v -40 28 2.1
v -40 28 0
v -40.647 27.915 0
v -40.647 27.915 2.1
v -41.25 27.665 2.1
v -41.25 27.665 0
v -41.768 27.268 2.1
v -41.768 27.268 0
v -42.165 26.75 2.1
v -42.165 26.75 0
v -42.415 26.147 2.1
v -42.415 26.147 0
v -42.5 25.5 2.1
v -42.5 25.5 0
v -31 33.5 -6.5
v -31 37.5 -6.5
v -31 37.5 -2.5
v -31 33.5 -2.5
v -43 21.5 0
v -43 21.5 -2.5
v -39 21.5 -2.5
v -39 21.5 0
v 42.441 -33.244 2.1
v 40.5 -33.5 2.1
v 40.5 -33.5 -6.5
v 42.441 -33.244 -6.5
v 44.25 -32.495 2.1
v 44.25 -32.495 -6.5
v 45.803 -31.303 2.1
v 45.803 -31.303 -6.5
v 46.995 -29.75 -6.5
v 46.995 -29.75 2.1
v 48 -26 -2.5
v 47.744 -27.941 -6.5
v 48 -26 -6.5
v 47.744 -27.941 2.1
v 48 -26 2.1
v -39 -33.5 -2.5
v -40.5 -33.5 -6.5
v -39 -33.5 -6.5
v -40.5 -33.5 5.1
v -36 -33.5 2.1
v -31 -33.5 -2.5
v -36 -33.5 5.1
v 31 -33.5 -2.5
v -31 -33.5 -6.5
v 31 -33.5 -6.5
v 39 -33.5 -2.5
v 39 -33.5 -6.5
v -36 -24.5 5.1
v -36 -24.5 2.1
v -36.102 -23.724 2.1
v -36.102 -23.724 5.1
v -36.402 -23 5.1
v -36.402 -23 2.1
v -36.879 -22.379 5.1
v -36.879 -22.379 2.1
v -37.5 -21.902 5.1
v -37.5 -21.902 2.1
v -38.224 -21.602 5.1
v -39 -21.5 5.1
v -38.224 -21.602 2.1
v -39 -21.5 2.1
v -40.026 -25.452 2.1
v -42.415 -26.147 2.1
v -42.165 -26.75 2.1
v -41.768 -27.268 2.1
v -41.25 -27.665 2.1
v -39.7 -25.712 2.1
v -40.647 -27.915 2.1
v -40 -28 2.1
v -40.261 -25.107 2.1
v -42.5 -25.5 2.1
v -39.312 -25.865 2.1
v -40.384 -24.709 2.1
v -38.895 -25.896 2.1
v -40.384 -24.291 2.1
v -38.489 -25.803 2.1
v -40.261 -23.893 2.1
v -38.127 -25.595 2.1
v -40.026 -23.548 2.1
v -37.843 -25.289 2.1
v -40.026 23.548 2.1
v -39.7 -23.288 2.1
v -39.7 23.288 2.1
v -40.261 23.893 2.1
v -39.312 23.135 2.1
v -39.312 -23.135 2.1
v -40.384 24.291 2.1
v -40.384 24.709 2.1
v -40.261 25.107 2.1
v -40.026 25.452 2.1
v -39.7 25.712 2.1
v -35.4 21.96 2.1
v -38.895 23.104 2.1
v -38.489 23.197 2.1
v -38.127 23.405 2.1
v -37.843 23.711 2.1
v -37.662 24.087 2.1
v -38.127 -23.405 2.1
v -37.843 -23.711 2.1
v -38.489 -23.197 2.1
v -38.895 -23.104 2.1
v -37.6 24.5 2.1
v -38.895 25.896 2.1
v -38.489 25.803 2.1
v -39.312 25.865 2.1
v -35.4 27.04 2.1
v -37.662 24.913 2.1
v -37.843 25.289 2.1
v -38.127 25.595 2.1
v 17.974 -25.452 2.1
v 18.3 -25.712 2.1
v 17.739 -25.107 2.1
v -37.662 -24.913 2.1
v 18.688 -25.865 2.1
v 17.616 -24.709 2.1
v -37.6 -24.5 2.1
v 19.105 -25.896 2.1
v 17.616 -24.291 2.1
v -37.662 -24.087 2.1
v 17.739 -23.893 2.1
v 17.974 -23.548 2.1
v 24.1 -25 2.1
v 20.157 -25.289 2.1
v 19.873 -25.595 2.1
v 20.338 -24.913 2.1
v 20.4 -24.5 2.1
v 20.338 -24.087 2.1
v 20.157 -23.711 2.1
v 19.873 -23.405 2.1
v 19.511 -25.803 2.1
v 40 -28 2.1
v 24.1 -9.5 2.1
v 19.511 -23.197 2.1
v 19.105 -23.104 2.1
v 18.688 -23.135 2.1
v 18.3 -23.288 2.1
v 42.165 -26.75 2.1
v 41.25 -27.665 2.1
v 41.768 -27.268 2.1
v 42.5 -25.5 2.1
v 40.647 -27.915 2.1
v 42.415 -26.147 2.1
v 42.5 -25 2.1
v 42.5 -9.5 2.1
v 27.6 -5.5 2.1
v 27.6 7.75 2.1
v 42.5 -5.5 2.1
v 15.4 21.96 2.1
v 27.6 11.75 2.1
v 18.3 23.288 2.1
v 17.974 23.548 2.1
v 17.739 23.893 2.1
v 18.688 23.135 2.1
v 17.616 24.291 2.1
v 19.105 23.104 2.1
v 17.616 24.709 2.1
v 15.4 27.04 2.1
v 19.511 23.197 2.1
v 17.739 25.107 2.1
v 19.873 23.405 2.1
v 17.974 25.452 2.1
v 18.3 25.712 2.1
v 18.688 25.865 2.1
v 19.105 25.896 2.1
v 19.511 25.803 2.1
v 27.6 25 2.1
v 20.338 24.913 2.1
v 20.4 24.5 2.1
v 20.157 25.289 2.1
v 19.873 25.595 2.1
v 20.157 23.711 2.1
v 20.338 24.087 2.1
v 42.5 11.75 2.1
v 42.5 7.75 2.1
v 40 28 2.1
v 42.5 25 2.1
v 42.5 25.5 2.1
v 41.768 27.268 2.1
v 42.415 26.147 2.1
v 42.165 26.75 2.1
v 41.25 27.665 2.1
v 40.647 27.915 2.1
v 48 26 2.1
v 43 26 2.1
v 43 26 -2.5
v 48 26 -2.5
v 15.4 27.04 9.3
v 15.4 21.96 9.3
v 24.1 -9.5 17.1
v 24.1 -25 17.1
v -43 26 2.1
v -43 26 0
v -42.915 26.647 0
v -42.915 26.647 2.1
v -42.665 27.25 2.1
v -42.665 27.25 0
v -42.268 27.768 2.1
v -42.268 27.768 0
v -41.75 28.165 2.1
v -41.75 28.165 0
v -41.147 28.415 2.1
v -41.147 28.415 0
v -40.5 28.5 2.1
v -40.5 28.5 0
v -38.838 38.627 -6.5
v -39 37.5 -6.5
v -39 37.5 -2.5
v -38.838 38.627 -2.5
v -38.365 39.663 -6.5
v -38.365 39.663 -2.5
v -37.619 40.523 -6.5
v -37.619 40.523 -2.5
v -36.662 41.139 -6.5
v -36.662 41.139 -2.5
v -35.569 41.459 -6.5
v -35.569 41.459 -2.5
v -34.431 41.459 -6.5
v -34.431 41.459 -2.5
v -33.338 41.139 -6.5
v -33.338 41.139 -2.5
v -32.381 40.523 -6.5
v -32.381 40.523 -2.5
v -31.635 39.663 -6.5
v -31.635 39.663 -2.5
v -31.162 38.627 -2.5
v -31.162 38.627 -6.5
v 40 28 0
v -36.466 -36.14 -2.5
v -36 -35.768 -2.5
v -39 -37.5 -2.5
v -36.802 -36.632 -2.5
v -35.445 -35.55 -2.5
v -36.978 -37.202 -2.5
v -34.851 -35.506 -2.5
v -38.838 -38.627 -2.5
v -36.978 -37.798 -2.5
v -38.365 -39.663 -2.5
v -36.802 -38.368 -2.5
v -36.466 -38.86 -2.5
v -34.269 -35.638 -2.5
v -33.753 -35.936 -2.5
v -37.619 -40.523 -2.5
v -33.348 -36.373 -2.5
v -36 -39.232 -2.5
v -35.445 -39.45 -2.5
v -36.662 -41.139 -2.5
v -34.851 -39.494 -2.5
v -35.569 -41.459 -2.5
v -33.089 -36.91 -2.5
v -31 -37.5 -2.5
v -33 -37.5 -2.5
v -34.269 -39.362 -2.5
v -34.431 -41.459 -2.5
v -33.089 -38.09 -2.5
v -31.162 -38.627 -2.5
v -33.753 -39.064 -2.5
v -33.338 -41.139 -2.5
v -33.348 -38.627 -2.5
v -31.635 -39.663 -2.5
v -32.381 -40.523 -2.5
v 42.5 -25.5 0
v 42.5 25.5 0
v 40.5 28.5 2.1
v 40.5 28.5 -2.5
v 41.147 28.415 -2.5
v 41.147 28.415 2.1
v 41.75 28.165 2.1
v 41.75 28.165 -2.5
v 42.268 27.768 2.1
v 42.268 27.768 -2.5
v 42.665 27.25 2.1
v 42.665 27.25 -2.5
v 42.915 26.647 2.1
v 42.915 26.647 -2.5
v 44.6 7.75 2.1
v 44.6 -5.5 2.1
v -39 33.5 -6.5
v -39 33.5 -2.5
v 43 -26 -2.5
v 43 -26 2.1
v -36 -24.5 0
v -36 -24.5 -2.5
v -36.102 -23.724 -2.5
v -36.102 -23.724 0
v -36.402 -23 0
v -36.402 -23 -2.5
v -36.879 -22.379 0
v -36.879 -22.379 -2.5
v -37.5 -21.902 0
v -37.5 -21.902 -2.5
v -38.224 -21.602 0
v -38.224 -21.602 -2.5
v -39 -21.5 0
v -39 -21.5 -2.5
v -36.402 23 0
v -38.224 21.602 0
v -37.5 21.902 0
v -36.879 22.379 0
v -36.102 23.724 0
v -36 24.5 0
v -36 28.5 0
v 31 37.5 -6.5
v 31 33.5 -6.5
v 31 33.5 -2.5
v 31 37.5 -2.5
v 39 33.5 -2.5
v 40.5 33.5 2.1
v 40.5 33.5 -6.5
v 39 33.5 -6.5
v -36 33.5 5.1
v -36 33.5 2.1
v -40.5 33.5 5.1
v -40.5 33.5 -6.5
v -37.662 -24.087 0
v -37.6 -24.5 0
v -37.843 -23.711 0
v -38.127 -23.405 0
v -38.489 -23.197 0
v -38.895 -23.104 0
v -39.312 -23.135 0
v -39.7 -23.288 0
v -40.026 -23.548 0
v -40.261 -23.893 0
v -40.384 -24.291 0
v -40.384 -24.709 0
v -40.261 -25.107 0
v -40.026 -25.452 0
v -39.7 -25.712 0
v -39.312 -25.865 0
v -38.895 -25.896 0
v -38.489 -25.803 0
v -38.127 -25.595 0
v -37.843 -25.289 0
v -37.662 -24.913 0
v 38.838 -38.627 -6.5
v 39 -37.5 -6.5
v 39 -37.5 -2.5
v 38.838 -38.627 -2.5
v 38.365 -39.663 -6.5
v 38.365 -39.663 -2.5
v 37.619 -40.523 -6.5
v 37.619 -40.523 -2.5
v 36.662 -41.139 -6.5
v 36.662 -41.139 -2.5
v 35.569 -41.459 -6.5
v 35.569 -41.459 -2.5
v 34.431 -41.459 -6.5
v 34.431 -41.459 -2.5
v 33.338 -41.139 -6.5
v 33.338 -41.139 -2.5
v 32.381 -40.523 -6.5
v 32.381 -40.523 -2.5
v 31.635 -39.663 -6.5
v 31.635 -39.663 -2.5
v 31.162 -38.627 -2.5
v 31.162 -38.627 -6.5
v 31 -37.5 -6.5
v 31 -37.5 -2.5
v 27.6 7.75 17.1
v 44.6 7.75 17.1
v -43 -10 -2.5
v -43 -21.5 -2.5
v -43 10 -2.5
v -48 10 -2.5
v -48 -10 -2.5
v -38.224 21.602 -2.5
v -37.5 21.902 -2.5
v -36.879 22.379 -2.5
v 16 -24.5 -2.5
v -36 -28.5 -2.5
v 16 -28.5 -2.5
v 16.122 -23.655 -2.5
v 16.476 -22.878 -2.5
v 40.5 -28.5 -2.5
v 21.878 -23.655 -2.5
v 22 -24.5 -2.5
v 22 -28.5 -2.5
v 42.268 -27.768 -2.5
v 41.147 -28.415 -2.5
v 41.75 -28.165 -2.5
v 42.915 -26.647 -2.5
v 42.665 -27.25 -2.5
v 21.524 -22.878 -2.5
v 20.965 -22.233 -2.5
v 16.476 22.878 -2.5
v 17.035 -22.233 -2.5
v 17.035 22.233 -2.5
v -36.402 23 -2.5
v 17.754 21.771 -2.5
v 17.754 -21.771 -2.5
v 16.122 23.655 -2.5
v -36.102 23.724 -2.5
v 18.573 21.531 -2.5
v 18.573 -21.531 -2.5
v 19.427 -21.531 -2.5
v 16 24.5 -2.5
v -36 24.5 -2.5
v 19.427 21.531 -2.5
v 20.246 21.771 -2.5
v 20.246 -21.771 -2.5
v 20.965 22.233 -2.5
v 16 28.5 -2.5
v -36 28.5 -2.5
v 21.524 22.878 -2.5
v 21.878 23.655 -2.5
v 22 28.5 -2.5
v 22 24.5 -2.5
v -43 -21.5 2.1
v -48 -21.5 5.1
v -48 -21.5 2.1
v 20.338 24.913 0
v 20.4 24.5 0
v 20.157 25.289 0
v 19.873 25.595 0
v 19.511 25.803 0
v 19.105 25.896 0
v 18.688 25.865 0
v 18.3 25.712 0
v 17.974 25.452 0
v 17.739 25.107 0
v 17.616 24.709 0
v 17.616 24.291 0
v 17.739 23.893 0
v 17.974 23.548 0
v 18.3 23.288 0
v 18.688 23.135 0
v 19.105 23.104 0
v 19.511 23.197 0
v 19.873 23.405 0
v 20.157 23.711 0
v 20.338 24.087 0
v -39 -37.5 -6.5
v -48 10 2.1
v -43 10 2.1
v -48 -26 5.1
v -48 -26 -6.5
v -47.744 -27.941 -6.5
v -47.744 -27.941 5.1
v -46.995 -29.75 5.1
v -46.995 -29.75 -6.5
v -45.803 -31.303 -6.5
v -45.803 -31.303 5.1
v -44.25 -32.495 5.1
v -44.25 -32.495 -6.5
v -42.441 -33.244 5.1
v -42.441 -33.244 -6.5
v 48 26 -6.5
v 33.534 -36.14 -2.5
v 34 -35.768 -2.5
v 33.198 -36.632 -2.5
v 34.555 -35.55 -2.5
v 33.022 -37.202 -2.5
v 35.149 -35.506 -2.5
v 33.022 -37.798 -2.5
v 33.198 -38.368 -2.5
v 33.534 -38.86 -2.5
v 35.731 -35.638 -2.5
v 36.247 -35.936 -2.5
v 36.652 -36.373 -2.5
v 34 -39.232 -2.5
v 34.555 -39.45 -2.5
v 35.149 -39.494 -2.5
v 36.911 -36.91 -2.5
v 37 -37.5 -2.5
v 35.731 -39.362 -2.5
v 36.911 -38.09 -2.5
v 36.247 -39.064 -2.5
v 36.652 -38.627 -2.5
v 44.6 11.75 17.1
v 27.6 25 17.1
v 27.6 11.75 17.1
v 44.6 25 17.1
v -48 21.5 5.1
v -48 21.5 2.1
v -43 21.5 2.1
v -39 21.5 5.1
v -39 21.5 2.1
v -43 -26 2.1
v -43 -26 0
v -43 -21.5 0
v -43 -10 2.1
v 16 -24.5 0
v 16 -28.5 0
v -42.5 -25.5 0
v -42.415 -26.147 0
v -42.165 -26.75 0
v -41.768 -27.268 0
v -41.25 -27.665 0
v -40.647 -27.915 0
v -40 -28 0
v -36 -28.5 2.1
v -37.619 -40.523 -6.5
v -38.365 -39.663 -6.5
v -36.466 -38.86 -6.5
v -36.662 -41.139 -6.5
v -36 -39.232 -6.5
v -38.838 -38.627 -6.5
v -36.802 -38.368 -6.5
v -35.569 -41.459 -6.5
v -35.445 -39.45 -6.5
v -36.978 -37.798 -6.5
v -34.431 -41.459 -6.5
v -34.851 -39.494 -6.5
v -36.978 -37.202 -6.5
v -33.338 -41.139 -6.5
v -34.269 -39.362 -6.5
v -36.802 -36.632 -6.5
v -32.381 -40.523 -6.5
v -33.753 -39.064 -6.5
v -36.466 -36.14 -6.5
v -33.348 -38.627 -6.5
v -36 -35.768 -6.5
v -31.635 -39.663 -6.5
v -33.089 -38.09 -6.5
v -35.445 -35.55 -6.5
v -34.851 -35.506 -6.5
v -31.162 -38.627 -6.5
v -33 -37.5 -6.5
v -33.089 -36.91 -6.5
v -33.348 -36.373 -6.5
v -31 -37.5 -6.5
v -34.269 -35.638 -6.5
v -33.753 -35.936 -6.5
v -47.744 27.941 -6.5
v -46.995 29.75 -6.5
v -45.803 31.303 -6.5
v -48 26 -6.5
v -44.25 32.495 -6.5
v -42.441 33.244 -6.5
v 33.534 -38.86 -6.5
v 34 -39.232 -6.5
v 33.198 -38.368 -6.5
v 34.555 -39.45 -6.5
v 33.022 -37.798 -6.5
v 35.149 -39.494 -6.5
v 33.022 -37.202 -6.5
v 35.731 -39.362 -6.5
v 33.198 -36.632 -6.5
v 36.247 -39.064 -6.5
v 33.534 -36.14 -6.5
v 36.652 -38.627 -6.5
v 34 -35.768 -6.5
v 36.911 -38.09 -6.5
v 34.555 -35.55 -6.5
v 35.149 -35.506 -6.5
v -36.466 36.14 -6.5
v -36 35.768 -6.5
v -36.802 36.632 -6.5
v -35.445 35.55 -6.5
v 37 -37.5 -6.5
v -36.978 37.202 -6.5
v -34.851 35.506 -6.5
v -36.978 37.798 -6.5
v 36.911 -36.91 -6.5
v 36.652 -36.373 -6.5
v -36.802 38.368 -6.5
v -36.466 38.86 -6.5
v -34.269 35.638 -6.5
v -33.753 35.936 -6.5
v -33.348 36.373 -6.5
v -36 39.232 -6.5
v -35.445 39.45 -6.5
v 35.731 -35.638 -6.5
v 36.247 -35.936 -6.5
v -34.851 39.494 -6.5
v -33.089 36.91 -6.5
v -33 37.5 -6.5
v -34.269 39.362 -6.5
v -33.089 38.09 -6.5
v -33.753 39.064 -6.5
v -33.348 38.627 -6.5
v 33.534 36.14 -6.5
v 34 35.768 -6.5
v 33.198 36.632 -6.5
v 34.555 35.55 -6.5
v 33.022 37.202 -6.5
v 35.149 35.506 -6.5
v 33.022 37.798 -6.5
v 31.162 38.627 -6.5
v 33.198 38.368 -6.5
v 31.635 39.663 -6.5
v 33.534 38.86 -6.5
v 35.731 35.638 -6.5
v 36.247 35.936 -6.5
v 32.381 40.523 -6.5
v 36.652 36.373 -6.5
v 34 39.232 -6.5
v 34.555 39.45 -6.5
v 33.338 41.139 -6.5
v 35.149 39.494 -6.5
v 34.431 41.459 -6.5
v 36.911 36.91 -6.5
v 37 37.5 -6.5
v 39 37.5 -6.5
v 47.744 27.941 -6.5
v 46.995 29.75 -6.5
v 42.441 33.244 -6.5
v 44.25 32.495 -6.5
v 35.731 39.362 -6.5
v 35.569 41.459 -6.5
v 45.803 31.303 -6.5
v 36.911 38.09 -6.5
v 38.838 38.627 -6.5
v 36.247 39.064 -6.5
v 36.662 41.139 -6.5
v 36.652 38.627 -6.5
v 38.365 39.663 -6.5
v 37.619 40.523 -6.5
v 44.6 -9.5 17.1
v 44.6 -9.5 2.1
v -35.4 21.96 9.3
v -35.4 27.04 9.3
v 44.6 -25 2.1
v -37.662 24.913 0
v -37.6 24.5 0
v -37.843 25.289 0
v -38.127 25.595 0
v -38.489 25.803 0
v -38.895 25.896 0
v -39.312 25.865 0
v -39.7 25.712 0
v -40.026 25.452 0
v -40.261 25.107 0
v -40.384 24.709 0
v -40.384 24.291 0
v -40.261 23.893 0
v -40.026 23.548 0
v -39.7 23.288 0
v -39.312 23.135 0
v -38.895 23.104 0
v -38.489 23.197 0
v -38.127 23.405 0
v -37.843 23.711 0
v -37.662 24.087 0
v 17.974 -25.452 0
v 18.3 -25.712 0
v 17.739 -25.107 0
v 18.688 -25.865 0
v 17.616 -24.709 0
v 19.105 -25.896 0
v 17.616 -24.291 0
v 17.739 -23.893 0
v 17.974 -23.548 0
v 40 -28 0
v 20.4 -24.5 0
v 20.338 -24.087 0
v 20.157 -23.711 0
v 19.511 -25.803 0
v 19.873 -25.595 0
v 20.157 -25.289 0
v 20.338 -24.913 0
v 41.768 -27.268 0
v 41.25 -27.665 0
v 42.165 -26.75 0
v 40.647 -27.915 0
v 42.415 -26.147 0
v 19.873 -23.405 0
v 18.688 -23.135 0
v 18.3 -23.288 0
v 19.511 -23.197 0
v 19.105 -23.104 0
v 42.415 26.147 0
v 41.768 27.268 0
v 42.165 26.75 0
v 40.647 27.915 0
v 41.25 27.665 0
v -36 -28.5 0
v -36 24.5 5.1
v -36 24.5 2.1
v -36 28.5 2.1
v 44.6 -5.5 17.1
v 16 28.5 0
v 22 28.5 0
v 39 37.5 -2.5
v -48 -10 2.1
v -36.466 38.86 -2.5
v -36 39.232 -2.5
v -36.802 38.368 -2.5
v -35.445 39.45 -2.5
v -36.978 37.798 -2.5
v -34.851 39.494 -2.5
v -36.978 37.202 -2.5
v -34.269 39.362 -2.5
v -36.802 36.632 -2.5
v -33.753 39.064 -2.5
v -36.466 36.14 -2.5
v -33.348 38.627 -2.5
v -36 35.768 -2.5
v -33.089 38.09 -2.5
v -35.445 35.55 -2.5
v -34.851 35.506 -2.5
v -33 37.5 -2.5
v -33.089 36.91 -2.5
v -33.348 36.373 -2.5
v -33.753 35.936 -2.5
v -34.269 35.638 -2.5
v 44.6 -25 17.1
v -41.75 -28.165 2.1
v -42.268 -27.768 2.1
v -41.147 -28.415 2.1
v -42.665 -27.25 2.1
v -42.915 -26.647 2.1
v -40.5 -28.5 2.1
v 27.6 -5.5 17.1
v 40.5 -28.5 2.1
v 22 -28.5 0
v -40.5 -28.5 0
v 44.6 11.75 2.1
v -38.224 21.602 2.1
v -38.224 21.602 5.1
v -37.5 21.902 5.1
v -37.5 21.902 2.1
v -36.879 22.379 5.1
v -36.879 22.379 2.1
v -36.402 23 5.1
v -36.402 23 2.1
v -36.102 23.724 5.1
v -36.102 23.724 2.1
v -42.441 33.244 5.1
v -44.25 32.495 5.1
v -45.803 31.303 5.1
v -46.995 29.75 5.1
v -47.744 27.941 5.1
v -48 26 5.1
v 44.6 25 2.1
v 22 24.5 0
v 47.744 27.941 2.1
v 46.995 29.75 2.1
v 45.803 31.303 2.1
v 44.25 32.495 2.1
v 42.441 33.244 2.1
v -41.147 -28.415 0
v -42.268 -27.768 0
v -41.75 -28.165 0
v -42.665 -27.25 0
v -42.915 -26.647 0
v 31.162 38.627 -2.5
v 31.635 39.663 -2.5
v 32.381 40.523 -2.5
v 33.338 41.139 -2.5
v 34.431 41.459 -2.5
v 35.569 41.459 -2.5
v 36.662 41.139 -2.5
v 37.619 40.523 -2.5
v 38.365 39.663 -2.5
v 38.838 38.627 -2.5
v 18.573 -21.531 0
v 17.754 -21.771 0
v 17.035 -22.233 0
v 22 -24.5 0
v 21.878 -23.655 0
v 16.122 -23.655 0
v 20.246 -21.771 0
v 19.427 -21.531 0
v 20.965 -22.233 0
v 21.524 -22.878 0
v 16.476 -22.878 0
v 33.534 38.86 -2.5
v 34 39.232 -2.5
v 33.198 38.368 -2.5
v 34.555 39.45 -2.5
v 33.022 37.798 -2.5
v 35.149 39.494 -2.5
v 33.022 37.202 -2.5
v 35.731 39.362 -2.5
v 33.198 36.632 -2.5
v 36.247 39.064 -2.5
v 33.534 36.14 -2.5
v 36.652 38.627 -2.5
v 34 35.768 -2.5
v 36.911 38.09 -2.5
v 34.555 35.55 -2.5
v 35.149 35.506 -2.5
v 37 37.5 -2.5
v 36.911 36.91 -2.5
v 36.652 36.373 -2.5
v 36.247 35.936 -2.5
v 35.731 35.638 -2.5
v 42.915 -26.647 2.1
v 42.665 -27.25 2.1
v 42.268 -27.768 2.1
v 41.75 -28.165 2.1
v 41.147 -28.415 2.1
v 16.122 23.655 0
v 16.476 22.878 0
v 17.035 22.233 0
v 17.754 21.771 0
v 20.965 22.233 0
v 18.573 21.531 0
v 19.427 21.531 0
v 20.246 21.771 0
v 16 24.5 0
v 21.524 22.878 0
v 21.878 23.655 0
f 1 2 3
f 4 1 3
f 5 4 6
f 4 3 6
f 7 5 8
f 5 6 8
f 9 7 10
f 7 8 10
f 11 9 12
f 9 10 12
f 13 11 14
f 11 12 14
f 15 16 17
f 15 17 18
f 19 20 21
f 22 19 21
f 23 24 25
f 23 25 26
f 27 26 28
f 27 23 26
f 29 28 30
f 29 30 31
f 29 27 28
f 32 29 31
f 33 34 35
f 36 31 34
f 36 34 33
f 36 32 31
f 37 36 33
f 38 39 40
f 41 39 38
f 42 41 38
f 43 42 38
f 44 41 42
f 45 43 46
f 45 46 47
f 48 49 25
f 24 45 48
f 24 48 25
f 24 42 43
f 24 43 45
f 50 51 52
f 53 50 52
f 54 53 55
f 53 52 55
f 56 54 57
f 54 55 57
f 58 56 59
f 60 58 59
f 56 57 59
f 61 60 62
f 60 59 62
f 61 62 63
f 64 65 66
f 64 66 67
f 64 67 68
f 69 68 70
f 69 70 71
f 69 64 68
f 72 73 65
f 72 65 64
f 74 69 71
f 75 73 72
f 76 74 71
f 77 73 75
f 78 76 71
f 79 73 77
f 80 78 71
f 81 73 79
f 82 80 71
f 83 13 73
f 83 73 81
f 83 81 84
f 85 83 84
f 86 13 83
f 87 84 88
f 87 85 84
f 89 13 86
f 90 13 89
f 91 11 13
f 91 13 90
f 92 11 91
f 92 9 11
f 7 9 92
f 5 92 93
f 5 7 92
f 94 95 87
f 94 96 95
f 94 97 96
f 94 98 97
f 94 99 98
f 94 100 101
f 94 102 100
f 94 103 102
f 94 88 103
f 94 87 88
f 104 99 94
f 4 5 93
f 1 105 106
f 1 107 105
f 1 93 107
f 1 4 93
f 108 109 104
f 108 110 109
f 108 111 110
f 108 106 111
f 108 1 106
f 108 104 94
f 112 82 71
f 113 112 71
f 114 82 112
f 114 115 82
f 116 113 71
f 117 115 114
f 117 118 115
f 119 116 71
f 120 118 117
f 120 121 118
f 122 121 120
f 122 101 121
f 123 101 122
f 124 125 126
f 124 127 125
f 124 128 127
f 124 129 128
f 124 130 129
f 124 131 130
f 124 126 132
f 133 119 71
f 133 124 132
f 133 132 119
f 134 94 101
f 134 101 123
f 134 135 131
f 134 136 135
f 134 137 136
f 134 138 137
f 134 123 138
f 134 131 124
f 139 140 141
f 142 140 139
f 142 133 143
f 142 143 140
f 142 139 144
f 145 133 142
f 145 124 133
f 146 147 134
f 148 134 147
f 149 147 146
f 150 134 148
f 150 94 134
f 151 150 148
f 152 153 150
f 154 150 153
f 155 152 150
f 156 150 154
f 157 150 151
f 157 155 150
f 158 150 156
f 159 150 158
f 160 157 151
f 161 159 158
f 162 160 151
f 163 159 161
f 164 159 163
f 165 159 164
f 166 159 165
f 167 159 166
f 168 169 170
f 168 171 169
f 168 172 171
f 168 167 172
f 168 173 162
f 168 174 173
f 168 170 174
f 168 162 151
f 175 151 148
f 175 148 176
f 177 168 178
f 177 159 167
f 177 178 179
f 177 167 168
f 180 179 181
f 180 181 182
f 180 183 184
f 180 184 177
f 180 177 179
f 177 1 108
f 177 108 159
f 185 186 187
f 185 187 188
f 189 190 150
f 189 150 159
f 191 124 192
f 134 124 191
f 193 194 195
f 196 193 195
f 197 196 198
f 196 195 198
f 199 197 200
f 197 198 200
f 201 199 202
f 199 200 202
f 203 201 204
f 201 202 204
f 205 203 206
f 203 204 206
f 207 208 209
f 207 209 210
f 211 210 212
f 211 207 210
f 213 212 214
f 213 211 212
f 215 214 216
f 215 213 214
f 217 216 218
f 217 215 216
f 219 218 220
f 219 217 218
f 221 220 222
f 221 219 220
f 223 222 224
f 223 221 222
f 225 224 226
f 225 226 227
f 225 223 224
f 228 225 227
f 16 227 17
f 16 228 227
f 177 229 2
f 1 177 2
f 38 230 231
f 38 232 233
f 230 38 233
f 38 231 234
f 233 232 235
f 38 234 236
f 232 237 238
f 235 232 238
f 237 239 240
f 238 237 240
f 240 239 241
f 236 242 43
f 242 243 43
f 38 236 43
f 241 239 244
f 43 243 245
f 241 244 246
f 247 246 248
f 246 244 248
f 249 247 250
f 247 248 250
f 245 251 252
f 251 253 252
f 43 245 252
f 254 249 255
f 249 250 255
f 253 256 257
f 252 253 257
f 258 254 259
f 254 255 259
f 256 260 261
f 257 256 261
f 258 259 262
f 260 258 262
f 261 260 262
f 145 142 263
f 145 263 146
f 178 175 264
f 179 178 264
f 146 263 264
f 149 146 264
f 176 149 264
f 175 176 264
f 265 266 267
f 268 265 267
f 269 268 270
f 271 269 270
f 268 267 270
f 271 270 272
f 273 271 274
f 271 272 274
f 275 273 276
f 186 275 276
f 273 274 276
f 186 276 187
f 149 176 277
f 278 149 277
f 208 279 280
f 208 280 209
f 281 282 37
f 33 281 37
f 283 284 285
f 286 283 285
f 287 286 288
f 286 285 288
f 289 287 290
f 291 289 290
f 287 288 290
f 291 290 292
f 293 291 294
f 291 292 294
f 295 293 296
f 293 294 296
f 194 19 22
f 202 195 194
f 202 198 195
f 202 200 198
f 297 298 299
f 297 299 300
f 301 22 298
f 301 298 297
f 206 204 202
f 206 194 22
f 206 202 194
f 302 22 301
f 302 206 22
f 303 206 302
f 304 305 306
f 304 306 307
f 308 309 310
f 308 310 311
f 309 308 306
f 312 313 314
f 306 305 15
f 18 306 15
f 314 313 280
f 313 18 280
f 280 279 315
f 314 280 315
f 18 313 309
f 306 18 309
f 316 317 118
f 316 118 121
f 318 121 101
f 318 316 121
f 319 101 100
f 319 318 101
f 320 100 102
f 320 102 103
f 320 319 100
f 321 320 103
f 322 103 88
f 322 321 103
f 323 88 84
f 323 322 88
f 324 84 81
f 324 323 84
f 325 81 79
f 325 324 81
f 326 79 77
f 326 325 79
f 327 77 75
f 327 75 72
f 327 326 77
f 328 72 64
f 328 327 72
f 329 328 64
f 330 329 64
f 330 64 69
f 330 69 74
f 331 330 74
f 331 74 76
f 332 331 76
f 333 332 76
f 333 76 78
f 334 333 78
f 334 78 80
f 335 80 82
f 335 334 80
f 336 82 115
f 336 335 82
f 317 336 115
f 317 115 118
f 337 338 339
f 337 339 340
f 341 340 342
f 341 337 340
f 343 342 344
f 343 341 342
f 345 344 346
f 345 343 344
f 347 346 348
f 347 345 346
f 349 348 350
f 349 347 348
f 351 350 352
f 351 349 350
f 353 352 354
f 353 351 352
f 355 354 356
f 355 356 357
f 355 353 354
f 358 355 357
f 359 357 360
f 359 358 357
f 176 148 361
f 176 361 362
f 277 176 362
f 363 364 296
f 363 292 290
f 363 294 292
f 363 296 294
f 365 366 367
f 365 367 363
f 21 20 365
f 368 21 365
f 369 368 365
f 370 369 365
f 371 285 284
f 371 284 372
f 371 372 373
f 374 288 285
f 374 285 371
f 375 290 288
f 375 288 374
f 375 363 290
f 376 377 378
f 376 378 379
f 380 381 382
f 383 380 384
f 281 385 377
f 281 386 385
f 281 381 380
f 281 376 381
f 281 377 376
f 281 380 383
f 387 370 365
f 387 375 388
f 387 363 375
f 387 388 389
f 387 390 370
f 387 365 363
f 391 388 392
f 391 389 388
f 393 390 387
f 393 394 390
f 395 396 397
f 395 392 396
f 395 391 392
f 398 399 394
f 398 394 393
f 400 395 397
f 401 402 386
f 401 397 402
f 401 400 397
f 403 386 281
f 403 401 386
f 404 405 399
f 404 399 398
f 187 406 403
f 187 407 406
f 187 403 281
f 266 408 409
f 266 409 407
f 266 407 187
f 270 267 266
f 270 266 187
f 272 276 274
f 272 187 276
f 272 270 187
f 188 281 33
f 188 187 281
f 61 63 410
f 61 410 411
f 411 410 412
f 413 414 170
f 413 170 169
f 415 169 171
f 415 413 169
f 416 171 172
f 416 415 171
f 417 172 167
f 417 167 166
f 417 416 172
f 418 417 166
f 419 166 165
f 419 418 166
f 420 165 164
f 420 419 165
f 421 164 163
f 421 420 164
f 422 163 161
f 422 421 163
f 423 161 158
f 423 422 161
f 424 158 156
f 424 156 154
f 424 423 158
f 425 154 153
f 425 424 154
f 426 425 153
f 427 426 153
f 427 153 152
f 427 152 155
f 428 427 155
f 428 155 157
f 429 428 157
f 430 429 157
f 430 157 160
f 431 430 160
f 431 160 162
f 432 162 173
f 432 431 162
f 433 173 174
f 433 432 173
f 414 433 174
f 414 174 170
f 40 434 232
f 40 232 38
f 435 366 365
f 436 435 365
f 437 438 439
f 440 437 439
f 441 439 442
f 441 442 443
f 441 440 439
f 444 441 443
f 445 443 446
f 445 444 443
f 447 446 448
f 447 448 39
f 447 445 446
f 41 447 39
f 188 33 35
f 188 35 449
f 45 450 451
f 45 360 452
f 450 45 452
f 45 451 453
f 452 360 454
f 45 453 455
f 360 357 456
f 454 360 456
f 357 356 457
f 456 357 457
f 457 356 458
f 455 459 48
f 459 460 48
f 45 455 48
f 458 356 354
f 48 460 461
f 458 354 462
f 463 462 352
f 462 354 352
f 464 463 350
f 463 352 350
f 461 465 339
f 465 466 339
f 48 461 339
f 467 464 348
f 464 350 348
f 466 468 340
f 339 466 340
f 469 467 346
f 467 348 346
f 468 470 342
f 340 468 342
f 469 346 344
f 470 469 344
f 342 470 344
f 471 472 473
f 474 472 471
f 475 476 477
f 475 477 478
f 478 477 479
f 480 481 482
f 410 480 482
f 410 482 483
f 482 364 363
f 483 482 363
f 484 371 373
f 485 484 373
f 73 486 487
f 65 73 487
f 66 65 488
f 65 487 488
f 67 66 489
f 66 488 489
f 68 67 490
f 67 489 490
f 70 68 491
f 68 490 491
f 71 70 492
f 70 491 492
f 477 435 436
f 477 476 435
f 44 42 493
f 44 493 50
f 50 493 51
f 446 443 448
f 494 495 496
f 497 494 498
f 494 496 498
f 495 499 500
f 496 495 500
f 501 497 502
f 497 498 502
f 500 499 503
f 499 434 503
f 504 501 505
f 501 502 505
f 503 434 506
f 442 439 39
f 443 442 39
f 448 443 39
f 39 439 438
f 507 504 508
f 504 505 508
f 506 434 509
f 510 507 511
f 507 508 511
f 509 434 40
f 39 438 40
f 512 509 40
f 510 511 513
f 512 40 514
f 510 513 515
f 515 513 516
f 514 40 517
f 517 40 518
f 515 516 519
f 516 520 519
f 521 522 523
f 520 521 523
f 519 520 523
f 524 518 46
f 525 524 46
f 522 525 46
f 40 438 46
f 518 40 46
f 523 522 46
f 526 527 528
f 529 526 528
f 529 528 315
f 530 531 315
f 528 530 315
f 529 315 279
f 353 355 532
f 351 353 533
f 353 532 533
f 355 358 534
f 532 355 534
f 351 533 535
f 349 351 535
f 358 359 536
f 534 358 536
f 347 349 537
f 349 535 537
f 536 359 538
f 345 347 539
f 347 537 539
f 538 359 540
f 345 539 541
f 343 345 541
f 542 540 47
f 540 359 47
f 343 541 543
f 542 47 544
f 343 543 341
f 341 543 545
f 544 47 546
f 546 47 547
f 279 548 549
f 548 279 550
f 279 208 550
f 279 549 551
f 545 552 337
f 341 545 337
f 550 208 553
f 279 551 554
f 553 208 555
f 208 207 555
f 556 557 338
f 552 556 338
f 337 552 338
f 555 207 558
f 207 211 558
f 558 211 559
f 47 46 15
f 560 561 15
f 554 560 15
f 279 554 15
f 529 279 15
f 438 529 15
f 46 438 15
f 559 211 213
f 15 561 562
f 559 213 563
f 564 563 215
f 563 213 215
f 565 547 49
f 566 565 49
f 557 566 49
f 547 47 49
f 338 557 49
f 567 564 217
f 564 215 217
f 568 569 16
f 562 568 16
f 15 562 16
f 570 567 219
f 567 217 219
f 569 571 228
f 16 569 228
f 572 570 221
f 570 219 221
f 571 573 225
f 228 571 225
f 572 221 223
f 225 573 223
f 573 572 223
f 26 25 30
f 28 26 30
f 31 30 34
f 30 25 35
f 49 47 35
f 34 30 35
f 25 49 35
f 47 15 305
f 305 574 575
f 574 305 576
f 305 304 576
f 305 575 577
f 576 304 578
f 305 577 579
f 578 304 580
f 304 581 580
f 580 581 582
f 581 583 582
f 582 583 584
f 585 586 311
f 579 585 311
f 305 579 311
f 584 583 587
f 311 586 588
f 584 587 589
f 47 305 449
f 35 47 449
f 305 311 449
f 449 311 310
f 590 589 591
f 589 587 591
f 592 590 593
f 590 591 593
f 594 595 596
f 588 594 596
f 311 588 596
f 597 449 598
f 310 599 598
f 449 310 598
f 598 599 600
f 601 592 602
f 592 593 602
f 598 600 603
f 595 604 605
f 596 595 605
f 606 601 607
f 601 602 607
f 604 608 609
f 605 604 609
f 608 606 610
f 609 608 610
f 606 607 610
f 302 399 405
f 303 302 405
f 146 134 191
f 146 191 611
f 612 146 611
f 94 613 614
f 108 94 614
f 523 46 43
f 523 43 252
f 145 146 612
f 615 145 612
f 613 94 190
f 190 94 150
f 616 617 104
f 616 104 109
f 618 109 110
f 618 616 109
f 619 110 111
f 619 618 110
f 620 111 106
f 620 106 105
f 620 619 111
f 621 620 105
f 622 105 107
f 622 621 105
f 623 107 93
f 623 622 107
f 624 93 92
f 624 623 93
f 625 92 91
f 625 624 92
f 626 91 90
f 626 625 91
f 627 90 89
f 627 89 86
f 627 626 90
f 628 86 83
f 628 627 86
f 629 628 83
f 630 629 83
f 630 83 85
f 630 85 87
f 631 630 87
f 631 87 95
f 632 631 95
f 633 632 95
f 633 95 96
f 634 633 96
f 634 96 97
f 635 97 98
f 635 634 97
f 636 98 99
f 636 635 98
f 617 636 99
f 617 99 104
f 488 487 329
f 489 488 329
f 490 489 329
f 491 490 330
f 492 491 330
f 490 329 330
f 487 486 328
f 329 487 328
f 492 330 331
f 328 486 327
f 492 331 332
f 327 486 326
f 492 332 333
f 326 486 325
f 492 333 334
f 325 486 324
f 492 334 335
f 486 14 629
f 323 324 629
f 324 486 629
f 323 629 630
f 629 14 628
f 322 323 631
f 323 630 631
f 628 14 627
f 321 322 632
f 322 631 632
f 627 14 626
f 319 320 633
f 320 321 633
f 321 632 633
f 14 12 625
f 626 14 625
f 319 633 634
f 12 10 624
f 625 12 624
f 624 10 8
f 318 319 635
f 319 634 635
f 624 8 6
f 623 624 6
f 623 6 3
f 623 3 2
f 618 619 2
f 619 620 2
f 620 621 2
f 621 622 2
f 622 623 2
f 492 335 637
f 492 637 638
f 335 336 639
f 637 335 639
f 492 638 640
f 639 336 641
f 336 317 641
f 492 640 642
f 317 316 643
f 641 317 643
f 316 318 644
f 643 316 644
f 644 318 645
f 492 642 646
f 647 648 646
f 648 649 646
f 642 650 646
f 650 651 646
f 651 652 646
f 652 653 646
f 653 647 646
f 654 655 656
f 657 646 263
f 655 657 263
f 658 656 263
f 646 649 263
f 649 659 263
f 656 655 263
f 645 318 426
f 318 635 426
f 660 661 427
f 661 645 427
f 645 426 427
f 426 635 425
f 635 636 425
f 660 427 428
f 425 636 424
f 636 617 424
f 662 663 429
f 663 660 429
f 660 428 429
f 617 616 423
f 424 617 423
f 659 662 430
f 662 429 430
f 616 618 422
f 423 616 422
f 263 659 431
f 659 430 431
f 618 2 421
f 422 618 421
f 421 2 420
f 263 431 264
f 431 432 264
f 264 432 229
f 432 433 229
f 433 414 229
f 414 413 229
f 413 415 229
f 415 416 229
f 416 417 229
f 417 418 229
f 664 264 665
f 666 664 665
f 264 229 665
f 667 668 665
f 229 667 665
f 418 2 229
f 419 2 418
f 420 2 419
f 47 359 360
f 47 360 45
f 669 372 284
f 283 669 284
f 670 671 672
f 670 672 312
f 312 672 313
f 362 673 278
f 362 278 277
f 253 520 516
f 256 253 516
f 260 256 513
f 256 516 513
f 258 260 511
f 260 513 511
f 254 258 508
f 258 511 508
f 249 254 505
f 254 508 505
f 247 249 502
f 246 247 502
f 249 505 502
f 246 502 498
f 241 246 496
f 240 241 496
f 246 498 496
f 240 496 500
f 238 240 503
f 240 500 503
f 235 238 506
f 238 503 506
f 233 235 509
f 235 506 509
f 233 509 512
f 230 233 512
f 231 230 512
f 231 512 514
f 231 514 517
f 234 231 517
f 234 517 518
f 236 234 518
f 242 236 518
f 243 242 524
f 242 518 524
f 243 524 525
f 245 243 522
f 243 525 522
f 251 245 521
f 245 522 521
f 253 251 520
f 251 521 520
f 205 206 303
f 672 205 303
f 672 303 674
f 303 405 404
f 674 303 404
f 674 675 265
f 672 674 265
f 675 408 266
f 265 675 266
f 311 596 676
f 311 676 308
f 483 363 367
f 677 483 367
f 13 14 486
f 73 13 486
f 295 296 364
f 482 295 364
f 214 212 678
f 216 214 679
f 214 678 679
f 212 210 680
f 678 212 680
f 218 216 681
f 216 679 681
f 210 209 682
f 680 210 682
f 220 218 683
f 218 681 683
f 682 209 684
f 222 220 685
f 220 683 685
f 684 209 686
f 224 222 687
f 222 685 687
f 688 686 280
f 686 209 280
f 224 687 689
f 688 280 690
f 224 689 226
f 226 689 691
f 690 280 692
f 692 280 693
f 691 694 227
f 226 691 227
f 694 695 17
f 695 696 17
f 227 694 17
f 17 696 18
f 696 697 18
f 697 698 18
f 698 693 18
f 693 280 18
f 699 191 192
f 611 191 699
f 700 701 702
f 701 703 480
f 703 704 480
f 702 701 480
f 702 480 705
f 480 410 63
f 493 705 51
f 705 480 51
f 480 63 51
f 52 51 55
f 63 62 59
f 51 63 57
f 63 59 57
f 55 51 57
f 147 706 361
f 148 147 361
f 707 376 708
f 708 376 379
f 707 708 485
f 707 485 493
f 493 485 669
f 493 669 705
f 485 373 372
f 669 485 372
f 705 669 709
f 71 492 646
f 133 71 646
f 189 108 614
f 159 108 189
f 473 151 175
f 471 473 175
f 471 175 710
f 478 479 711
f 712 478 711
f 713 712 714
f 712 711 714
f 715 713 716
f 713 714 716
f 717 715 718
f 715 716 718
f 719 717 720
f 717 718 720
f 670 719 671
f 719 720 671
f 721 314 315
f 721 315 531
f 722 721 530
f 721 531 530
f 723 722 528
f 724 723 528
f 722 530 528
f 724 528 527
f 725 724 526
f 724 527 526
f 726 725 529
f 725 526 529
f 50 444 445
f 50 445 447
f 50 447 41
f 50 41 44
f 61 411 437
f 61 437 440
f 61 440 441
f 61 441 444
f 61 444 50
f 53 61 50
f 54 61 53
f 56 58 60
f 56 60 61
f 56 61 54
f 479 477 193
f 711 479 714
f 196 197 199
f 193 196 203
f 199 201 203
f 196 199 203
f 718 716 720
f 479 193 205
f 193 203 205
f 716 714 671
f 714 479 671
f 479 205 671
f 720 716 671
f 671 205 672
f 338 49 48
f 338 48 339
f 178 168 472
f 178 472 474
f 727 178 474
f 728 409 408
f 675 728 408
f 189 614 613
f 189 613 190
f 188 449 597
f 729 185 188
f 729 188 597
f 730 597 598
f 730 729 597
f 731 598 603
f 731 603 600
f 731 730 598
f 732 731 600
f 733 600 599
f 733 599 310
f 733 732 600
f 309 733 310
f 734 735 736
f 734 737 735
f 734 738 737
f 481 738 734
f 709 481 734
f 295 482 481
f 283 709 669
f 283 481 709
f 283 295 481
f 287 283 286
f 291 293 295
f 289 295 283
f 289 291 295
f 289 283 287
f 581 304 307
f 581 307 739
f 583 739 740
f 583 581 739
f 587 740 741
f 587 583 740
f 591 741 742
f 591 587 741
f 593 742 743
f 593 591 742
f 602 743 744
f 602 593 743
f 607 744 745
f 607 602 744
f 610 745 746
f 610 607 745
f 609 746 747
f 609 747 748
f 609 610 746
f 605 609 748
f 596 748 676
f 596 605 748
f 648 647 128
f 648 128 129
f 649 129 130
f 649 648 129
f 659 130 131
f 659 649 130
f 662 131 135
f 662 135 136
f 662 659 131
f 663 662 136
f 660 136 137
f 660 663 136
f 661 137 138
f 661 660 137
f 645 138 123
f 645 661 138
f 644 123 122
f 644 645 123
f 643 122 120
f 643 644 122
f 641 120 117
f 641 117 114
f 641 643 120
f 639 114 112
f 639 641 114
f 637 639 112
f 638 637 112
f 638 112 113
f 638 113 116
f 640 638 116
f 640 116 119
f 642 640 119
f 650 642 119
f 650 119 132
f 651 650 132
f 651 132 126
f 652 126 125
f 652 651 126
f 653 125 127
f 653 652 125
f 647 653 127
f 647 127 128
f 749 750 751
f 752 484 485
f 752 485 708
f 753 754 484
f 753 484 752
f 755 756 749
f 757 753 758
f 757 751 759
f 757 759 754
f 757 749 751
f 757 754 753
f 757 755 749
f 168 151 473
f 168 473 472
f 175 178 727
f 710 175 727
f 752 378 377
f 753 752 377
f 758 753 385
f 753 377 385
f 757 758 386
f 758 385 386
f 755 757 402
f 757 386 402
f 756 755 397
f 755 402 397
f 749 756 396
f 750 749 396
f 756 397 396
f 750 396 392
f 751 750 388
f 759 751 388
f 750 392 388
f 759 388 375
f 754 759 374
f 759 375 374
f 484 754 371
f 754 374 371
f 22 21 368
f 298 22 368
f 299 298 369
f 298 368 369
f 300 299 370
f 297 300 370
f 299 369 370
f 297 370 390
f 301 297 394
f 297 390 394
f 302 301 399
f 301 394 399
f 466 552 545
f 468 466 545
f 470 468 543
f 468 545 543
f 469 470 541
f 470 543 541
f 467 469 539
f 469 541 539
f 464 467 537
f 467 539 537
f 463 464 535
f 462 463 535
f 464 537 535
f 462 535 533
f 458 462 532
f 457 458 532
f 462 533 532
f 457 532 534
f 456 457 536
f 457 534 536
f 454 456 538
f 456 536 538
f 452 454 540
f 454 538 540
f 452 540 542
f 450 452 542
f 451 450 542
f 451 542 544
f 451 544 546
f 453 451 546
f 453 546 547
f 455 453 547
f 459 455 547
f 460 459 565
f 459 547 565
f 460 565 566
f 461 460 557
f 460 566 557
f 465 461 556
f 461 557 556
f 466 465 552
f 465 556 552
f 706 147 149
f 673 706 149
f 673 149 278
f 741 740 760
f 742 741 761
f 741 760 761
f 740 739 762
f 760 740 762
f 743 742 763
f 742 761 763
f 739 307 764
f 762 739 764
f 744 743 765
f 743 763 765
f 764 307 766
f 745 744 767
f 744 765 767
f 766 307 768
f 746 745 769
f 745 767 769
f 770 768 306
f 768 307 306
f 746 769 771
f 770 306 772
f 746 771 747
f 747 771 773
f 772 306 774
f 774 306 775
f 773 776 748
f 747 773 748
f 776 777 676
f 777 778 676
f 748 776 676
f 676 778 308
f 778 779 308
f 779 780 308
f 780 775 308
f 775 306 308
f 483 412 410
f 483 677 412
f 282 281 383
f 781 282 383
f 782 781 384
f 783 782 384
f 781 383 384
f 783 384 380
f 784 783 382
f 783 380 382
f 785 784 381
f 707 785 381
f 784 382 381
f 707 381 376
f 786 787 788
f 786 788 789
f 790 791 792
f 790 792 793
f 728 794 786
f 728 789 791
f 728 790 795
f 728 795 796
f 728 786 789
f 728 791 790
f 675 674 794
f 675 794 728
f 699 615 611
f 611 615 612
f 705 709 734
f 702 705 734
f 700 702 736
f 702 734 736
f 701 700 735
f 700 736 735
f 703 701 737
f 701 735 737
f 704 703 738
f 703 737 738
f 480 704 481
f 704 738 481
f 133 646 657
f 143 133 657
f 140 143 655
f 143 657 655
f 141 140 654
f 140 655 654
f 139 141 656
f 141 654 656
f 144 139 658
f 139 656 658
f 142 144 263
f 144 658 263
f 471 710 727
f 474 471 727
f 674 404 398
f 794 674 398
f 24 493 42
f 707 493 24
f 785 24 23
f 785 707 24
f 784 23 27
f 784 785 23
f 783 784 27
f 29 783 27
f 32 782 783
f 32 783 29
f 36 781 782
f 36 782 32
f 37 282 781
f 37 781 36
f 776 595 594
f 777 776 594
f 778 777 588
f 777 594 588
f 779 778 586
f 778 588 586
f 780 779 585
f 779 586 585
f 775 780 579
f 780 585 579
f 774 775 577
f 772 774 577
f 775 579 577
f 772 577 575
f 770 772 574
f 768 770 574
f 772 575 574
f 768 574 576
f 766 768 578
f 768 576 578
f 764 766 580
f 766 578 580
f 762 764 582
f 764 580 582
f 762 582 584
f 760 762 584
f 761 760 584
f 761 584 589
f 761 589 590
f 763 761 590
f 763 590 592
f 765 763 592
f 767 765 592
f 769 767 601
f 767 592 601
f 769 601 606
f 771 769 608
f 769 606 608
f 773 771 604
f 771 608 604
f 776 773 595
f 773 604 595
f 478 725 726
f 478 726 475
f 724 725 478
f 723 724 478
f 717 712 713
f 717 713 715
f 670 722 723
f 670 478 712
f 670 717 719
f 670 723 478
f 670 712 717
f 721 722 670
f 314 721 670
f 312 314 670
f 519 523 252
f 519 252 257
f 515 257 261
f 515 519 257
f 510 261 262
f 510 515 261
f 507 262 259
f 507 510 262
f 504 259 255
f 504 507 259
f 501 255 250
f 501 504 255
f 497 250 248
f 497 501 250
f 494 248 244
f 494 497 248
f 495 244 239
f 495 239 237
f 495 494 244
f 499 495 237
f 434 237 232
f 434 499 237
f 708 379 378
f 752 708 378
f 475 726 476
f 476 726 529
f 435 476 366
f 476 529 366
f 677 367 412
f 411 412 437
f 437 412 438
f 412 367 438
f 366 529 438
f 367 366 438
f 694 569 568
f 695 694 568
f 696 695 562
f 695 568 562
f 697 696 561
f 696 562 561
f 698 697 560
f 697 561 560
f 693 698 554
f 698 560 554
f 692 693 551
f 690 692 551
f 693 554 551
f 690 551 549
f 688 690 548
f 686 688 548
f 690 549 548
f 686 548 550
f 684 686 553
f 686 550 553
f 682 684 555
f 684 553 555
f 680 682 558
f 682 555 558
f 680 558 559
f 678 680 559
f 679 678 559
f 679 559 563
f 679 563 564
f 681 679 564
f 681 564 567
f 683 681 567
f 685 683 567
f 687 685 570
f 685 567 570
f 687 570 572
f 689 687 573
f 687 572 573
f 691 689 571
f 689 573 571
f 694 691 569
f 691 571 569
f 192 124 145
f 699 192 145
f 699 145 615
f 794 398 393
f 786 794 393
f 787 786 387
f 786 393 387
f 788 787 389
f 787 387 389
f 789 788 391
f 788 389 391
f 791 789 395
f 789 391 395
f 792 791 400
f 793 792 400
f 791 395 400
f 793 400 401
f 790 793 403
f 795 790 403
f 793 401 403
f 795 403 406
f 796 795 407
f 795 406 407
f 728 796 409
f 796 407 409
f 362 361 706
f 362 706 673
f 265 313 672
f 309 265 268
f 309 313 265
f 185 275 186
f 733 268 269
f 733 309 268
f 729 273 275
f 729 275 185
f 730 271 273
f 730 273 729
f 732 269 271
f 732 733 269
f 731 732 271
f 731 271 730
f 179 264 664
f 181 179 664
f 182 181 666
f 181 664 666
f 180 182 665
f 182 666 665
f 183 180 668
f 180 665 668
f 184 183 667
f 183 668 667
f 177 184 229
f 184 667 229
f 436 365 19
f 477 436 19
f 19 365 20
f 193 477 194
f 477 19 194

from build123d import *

# Parameters (mm, degrees)
F0_R      = 1.4
F1_DEPTH  = 2.1
F2_W      = 50.8
F2_H      = 5.08
F3_DEPTH  = 7.2
F4_W      = 17
F4_H      = 13.25
F4_W_2    = 20.5
F4_H_2    = 15.5
F5_DEPTH  = 15
F8_DEPTH  = 4.6
F10_DEPTH = 2.5
F12_DEPTH = 4
F13_W     = 32.5408354402
F13_H     = 52
F14_DEPTH = 4.6
F16_DEPTH = 3
F17_R     = 2
F18_DEPTH = 4


with BuildPart() as f1:
    # F0 (on Top) → F1 (new body)
    with BuildSketch(Plane.XY):
        with BuildLine():
            Line((40, 28), (-40, 28))
            ThreePointArc((-40, 28), (-41.767766953, 27.267766953), (-42.5, 25.5))
            Line((-42.5, 25.5), (-42.5, -25.5))
            ThreePointArc((-42.5, -25.5), (-41.767766953, -27.267766953), (-40, -28))
            Line((-40, -28), (40, -28))
            ThreePointArc((40, -28), (41.767766953, -27.267766953), (42.5, -25.5))
            Line((42.5, -25.5), (42.5, 25.5))
            ThreePointArc((42.5, 25.5), (41.767766953, 27.267766953), (40, 28))
        make_face()
        with Locations((-39, -24.5)):
            Circle(F0_R, mode=Mode.SUBTRACT)
        with Locations((19, -24.5)):
            Circle(F0_R, mode=Mode.SUBTRACT)
        with Locations((-39, 24.5)):
            Circle(F0_R, mode=Mode.SUBTRACT)
        with Locations((19, 24.5)):
            Circle(F0_R, mode=Mode.SUBTRACT)
    extrude(amount=F1_DEPTH)

    # F2 (on face) → F3 (join)
    with BuildSketch(Plane.XY.offset(2.1)):
        with Locations((-10, 24.5)):
            Rectangle(F2_W, F2_H)
    extrude(amount=F3_DEPTH)

    # F4 (on face) → F5 (join)
    with BuildSketch(Plane.XY.offset(2.1)):
        with Locations((36.1, 18.375)):
            Rectangle(F4_W, F4_H)
        with Locations((36.1, 1.125)):
            Rectangle(F4_W, F4_H)
        with Locations((34.35, -17.25)):
            Rectangle(F4_W_2, F4_H_2)
    extrude(amount=F5_DEPTH)


with BuildPart() as f8:
    # F7 (on offset) → F8 (new body, through all)
    with BuildSketch(Plane.XY.offset(-2.5)):
        with BuildLine():
            ThreePointArc((-43, 26), (-42.267766953, 27.767766953), (-40.5, 28.5))
            Line((-40.5, 28.5), (40.5, 28.5))
            ThreePointArc((40.5, 28.5), (42.267766953, 27.767766953), (43, 26))
            Line((43, 26), (43, -26))
            ThreePointArc((43, -26), (42.267766953, -27.767766953), (40.5, -28.5))
            Line((40.5, -28.5), (-40.5, -28.5))
            ThreePointArc((-40.5, -28.5), (-42.267766953, -27.767766953), (-43, -26))
            Line((-43, -26), (-43, -10))
            Line((-43, -10), (-48, -10))
            Line((-48, -10), (-48, -26))
            ThreePointArc((-48, -26), (-45.8033008589, -31.3033008589), (-40.5, -33.5))
            Line((-40.5, -33.5), (40.5, -33.5))
            ThreePointArc((40.5, -33.5), (45.8033008589, -31.3033008589), (48, -26))
            Line((48, -26), (48, 26))
            ThreePointArc((48, 26), (45.8033008589, 31.3033008589), (40.5, 33.5))
            Line((40.5, 33.5), (-40.5, 33.5))
            ThreePointArc((-40.5, 33.5), (-45.8033008589, 31.3033008589), (-48, 26))
            Line((-48, 26), (-48, 10))
            Line((-48, 10), (-43, 10))
            Line((-43, 10), (-43, 26))
        make_face()
    extrude(amount=F8_DEPTH)

    # F9 (on offset) → F10 (join, through all)
    with BuildSketch(Plane.XY.offset(-2.5)):
        with BuildLine():
            Line((22, -28.5), (22, -24.5))
            ThreePointArc((22, -24.5), (19, -21.5), (16, -24.5))
            Line((16, -24.5), (16, -28.5))
            Line((16, -28.5), (22, -28.5))
        make_face()
        with BuildLine():
            Line((22, 28.5), (16, 28.5))
            Line((16, 28.5), (16, 24.5))
            ThreePointArc((16, 24.5), (19, 21.5), (22, 24.5))
            Line((22, 24.5), (22, 28.5))
        make_face()
        with BuildLine():
            Line((-43, 21.5), (-39, 21.5))
            ThreePointArc((-39, 21.5), (-36.8786796564, 22.3786796564), (-36, 24.5))
            Line((-36, 24.5), (-36, 28.5))
            Line((-36, 28.5), (-43, 28.5))
            Line((-43, 28.5), (-43, 21.5))
        make_face()
        with BuildLine():
            ThreePointArc((-36, -24.5), (-36.8786796564, -22.3786796564), (-39, -21.5))
            Line((-39, -21.5), (-43, -21.5))
            Line((-43, -21.5), (-43, -28.5))
            Line((-43, -28.5), (-36, -28.5))
            Line((-36, -28.5), (-36, -24.5))
        make_face()
    extrude(amount=F10_DEPTH)

    # F11 (on offset) → F12 (join)
    with BuildSketch(Plane.XY.offset(-2.5)):
        with BuildLine():
            ThreePointArc((-48, -26), (-45.8033008589, -31.3033008589), (-40.5, -33.5))
            Line((-40.5, -33.5), (40.5, -33.5))
            ThreePointArc((40.5, -33.5), (45.8033008589, -31.3033008589), (48, -26))
            Line((48, -26), (48, 26))
            ThreePointArc((48, 26), (45.8033008589, 31.3033008589), (40.5, 33.5))
            Line((40.5, 33.5), (-40.5, 33.5))
            ThreePointArc((-40.5, 33.5), (-45.8033008589, 31.3033008589), (-48, 26))
            Line((-48, 26), (-48, -26))
        make_face()
    extrude(amount=-F12_DEPTH)

    # F13 (on face) → F14 (cut, through all)
    with BuildSketch(Plane.XY.offset(2.1)):
        with Locations((59.2704177201, 0)):
            Rectangle(F13_W, F13_H)
    extrude(amount=-F14_DEPTH, mode=Mode.SUBTRACT)

    # F15 (on face) → F16 (join)
    with BuildSketch(Plane.XY.offset(2.1)):
        with BuildLine():
            Line((-36, 33.5), (-40.5, 33.5))
            ThreePointArc((-40.5, 33.5), (-45.8033008589, 31.3033008589), (-48, 26))
            Line((-48, 26), (-48, 21.5))
            Line((-48, 21.5), (-39, 21.5))
            ThreePointArc((-39, 21.5), (-36.8786796564, 22.3786796564), (-36, 24.5))
            Line((-36, 24.5), (-36, 33.5))
        make_face()
        with BuildLine():
            ThreePointArc((-36, -24.5), (-36.8786796564, -22.3786796564), (-39, -21.5))
            Line((-39, -21.5), (-48, -21.5))
            Line((-48, -21.5), (-48, -26))
            ThreePointArc((-48, -26), (-45.8033008589, -31.3033008589), (-40.5, -33.5))
            Line((-40.5, -33.5), (-36, -33.5))
            Line((-36, -33.5), (-36, -24.5))
        make_face()
    extrude(amount=F16_DEPTH)

    # F17 (on face) → F18 (join)
    with BuildSketch(Plane(origin=(0, 0, -6.5), x_dir=(1, 0, 0), z_dir=(0, 0, -1))):
        with BuildLine():
            Line((-39, -33.5), (-39, -37.5))
            ThreePointArc((-39, -37.5), (-35, -41.5), (-31, -37.5))
            Line((-31, -37.5), (-31, -33.5))
            Line((-31, -33.5), (-39, -33.5))
        make_face()
        with Locations((-35, -37.5)):
            Circle(F17_R, mode=Mode.SUBTRACT)
        with BuildLine():
            Line((39, -33.5), (31, -33.5))
            Line((31, -33.5), (31, -37.5))
            ThreePointArc((31, -37.5), (35, -41.5), (39, -37.5))
            Line((39, -37.5), (39, -33.5))
        make_face()
        with Locations((35, -37.5)):
            Circle(F17_R, mode=Mode.SUBTRACT)
        with BuildLine():
            Line((31, 37.5), (31, 33.5))
            Line((31, 33.5), (39, 33.5))
            Line((39, 33.5), (39, 37.5))
            ThreePointArc((39, 37.5), (35, 41.5), (31, 37.5))
        make_face()
        with Locations((35, 37.5)):
            Circle(F17_R, mode=Mode.SUBTRACT)
        with BuildLine():
            ThreePointArc((-31, 37.5), (-35, 41.5), (-39, 37.5))
            Line((-39, 37.5), (-39, 33.5))
            Line((-39, 33.5), (-31, 33.5))
            Line((-31, 33.5), (-31, 37.5))
        make_face()
        with Locations((-35, 37.5)):
            Circle(F17_R, mode=Mode.SUBTRACT)
    extrude(amount=-F18_DEPTH)


solid = Compound([f1.part, f8.part])
